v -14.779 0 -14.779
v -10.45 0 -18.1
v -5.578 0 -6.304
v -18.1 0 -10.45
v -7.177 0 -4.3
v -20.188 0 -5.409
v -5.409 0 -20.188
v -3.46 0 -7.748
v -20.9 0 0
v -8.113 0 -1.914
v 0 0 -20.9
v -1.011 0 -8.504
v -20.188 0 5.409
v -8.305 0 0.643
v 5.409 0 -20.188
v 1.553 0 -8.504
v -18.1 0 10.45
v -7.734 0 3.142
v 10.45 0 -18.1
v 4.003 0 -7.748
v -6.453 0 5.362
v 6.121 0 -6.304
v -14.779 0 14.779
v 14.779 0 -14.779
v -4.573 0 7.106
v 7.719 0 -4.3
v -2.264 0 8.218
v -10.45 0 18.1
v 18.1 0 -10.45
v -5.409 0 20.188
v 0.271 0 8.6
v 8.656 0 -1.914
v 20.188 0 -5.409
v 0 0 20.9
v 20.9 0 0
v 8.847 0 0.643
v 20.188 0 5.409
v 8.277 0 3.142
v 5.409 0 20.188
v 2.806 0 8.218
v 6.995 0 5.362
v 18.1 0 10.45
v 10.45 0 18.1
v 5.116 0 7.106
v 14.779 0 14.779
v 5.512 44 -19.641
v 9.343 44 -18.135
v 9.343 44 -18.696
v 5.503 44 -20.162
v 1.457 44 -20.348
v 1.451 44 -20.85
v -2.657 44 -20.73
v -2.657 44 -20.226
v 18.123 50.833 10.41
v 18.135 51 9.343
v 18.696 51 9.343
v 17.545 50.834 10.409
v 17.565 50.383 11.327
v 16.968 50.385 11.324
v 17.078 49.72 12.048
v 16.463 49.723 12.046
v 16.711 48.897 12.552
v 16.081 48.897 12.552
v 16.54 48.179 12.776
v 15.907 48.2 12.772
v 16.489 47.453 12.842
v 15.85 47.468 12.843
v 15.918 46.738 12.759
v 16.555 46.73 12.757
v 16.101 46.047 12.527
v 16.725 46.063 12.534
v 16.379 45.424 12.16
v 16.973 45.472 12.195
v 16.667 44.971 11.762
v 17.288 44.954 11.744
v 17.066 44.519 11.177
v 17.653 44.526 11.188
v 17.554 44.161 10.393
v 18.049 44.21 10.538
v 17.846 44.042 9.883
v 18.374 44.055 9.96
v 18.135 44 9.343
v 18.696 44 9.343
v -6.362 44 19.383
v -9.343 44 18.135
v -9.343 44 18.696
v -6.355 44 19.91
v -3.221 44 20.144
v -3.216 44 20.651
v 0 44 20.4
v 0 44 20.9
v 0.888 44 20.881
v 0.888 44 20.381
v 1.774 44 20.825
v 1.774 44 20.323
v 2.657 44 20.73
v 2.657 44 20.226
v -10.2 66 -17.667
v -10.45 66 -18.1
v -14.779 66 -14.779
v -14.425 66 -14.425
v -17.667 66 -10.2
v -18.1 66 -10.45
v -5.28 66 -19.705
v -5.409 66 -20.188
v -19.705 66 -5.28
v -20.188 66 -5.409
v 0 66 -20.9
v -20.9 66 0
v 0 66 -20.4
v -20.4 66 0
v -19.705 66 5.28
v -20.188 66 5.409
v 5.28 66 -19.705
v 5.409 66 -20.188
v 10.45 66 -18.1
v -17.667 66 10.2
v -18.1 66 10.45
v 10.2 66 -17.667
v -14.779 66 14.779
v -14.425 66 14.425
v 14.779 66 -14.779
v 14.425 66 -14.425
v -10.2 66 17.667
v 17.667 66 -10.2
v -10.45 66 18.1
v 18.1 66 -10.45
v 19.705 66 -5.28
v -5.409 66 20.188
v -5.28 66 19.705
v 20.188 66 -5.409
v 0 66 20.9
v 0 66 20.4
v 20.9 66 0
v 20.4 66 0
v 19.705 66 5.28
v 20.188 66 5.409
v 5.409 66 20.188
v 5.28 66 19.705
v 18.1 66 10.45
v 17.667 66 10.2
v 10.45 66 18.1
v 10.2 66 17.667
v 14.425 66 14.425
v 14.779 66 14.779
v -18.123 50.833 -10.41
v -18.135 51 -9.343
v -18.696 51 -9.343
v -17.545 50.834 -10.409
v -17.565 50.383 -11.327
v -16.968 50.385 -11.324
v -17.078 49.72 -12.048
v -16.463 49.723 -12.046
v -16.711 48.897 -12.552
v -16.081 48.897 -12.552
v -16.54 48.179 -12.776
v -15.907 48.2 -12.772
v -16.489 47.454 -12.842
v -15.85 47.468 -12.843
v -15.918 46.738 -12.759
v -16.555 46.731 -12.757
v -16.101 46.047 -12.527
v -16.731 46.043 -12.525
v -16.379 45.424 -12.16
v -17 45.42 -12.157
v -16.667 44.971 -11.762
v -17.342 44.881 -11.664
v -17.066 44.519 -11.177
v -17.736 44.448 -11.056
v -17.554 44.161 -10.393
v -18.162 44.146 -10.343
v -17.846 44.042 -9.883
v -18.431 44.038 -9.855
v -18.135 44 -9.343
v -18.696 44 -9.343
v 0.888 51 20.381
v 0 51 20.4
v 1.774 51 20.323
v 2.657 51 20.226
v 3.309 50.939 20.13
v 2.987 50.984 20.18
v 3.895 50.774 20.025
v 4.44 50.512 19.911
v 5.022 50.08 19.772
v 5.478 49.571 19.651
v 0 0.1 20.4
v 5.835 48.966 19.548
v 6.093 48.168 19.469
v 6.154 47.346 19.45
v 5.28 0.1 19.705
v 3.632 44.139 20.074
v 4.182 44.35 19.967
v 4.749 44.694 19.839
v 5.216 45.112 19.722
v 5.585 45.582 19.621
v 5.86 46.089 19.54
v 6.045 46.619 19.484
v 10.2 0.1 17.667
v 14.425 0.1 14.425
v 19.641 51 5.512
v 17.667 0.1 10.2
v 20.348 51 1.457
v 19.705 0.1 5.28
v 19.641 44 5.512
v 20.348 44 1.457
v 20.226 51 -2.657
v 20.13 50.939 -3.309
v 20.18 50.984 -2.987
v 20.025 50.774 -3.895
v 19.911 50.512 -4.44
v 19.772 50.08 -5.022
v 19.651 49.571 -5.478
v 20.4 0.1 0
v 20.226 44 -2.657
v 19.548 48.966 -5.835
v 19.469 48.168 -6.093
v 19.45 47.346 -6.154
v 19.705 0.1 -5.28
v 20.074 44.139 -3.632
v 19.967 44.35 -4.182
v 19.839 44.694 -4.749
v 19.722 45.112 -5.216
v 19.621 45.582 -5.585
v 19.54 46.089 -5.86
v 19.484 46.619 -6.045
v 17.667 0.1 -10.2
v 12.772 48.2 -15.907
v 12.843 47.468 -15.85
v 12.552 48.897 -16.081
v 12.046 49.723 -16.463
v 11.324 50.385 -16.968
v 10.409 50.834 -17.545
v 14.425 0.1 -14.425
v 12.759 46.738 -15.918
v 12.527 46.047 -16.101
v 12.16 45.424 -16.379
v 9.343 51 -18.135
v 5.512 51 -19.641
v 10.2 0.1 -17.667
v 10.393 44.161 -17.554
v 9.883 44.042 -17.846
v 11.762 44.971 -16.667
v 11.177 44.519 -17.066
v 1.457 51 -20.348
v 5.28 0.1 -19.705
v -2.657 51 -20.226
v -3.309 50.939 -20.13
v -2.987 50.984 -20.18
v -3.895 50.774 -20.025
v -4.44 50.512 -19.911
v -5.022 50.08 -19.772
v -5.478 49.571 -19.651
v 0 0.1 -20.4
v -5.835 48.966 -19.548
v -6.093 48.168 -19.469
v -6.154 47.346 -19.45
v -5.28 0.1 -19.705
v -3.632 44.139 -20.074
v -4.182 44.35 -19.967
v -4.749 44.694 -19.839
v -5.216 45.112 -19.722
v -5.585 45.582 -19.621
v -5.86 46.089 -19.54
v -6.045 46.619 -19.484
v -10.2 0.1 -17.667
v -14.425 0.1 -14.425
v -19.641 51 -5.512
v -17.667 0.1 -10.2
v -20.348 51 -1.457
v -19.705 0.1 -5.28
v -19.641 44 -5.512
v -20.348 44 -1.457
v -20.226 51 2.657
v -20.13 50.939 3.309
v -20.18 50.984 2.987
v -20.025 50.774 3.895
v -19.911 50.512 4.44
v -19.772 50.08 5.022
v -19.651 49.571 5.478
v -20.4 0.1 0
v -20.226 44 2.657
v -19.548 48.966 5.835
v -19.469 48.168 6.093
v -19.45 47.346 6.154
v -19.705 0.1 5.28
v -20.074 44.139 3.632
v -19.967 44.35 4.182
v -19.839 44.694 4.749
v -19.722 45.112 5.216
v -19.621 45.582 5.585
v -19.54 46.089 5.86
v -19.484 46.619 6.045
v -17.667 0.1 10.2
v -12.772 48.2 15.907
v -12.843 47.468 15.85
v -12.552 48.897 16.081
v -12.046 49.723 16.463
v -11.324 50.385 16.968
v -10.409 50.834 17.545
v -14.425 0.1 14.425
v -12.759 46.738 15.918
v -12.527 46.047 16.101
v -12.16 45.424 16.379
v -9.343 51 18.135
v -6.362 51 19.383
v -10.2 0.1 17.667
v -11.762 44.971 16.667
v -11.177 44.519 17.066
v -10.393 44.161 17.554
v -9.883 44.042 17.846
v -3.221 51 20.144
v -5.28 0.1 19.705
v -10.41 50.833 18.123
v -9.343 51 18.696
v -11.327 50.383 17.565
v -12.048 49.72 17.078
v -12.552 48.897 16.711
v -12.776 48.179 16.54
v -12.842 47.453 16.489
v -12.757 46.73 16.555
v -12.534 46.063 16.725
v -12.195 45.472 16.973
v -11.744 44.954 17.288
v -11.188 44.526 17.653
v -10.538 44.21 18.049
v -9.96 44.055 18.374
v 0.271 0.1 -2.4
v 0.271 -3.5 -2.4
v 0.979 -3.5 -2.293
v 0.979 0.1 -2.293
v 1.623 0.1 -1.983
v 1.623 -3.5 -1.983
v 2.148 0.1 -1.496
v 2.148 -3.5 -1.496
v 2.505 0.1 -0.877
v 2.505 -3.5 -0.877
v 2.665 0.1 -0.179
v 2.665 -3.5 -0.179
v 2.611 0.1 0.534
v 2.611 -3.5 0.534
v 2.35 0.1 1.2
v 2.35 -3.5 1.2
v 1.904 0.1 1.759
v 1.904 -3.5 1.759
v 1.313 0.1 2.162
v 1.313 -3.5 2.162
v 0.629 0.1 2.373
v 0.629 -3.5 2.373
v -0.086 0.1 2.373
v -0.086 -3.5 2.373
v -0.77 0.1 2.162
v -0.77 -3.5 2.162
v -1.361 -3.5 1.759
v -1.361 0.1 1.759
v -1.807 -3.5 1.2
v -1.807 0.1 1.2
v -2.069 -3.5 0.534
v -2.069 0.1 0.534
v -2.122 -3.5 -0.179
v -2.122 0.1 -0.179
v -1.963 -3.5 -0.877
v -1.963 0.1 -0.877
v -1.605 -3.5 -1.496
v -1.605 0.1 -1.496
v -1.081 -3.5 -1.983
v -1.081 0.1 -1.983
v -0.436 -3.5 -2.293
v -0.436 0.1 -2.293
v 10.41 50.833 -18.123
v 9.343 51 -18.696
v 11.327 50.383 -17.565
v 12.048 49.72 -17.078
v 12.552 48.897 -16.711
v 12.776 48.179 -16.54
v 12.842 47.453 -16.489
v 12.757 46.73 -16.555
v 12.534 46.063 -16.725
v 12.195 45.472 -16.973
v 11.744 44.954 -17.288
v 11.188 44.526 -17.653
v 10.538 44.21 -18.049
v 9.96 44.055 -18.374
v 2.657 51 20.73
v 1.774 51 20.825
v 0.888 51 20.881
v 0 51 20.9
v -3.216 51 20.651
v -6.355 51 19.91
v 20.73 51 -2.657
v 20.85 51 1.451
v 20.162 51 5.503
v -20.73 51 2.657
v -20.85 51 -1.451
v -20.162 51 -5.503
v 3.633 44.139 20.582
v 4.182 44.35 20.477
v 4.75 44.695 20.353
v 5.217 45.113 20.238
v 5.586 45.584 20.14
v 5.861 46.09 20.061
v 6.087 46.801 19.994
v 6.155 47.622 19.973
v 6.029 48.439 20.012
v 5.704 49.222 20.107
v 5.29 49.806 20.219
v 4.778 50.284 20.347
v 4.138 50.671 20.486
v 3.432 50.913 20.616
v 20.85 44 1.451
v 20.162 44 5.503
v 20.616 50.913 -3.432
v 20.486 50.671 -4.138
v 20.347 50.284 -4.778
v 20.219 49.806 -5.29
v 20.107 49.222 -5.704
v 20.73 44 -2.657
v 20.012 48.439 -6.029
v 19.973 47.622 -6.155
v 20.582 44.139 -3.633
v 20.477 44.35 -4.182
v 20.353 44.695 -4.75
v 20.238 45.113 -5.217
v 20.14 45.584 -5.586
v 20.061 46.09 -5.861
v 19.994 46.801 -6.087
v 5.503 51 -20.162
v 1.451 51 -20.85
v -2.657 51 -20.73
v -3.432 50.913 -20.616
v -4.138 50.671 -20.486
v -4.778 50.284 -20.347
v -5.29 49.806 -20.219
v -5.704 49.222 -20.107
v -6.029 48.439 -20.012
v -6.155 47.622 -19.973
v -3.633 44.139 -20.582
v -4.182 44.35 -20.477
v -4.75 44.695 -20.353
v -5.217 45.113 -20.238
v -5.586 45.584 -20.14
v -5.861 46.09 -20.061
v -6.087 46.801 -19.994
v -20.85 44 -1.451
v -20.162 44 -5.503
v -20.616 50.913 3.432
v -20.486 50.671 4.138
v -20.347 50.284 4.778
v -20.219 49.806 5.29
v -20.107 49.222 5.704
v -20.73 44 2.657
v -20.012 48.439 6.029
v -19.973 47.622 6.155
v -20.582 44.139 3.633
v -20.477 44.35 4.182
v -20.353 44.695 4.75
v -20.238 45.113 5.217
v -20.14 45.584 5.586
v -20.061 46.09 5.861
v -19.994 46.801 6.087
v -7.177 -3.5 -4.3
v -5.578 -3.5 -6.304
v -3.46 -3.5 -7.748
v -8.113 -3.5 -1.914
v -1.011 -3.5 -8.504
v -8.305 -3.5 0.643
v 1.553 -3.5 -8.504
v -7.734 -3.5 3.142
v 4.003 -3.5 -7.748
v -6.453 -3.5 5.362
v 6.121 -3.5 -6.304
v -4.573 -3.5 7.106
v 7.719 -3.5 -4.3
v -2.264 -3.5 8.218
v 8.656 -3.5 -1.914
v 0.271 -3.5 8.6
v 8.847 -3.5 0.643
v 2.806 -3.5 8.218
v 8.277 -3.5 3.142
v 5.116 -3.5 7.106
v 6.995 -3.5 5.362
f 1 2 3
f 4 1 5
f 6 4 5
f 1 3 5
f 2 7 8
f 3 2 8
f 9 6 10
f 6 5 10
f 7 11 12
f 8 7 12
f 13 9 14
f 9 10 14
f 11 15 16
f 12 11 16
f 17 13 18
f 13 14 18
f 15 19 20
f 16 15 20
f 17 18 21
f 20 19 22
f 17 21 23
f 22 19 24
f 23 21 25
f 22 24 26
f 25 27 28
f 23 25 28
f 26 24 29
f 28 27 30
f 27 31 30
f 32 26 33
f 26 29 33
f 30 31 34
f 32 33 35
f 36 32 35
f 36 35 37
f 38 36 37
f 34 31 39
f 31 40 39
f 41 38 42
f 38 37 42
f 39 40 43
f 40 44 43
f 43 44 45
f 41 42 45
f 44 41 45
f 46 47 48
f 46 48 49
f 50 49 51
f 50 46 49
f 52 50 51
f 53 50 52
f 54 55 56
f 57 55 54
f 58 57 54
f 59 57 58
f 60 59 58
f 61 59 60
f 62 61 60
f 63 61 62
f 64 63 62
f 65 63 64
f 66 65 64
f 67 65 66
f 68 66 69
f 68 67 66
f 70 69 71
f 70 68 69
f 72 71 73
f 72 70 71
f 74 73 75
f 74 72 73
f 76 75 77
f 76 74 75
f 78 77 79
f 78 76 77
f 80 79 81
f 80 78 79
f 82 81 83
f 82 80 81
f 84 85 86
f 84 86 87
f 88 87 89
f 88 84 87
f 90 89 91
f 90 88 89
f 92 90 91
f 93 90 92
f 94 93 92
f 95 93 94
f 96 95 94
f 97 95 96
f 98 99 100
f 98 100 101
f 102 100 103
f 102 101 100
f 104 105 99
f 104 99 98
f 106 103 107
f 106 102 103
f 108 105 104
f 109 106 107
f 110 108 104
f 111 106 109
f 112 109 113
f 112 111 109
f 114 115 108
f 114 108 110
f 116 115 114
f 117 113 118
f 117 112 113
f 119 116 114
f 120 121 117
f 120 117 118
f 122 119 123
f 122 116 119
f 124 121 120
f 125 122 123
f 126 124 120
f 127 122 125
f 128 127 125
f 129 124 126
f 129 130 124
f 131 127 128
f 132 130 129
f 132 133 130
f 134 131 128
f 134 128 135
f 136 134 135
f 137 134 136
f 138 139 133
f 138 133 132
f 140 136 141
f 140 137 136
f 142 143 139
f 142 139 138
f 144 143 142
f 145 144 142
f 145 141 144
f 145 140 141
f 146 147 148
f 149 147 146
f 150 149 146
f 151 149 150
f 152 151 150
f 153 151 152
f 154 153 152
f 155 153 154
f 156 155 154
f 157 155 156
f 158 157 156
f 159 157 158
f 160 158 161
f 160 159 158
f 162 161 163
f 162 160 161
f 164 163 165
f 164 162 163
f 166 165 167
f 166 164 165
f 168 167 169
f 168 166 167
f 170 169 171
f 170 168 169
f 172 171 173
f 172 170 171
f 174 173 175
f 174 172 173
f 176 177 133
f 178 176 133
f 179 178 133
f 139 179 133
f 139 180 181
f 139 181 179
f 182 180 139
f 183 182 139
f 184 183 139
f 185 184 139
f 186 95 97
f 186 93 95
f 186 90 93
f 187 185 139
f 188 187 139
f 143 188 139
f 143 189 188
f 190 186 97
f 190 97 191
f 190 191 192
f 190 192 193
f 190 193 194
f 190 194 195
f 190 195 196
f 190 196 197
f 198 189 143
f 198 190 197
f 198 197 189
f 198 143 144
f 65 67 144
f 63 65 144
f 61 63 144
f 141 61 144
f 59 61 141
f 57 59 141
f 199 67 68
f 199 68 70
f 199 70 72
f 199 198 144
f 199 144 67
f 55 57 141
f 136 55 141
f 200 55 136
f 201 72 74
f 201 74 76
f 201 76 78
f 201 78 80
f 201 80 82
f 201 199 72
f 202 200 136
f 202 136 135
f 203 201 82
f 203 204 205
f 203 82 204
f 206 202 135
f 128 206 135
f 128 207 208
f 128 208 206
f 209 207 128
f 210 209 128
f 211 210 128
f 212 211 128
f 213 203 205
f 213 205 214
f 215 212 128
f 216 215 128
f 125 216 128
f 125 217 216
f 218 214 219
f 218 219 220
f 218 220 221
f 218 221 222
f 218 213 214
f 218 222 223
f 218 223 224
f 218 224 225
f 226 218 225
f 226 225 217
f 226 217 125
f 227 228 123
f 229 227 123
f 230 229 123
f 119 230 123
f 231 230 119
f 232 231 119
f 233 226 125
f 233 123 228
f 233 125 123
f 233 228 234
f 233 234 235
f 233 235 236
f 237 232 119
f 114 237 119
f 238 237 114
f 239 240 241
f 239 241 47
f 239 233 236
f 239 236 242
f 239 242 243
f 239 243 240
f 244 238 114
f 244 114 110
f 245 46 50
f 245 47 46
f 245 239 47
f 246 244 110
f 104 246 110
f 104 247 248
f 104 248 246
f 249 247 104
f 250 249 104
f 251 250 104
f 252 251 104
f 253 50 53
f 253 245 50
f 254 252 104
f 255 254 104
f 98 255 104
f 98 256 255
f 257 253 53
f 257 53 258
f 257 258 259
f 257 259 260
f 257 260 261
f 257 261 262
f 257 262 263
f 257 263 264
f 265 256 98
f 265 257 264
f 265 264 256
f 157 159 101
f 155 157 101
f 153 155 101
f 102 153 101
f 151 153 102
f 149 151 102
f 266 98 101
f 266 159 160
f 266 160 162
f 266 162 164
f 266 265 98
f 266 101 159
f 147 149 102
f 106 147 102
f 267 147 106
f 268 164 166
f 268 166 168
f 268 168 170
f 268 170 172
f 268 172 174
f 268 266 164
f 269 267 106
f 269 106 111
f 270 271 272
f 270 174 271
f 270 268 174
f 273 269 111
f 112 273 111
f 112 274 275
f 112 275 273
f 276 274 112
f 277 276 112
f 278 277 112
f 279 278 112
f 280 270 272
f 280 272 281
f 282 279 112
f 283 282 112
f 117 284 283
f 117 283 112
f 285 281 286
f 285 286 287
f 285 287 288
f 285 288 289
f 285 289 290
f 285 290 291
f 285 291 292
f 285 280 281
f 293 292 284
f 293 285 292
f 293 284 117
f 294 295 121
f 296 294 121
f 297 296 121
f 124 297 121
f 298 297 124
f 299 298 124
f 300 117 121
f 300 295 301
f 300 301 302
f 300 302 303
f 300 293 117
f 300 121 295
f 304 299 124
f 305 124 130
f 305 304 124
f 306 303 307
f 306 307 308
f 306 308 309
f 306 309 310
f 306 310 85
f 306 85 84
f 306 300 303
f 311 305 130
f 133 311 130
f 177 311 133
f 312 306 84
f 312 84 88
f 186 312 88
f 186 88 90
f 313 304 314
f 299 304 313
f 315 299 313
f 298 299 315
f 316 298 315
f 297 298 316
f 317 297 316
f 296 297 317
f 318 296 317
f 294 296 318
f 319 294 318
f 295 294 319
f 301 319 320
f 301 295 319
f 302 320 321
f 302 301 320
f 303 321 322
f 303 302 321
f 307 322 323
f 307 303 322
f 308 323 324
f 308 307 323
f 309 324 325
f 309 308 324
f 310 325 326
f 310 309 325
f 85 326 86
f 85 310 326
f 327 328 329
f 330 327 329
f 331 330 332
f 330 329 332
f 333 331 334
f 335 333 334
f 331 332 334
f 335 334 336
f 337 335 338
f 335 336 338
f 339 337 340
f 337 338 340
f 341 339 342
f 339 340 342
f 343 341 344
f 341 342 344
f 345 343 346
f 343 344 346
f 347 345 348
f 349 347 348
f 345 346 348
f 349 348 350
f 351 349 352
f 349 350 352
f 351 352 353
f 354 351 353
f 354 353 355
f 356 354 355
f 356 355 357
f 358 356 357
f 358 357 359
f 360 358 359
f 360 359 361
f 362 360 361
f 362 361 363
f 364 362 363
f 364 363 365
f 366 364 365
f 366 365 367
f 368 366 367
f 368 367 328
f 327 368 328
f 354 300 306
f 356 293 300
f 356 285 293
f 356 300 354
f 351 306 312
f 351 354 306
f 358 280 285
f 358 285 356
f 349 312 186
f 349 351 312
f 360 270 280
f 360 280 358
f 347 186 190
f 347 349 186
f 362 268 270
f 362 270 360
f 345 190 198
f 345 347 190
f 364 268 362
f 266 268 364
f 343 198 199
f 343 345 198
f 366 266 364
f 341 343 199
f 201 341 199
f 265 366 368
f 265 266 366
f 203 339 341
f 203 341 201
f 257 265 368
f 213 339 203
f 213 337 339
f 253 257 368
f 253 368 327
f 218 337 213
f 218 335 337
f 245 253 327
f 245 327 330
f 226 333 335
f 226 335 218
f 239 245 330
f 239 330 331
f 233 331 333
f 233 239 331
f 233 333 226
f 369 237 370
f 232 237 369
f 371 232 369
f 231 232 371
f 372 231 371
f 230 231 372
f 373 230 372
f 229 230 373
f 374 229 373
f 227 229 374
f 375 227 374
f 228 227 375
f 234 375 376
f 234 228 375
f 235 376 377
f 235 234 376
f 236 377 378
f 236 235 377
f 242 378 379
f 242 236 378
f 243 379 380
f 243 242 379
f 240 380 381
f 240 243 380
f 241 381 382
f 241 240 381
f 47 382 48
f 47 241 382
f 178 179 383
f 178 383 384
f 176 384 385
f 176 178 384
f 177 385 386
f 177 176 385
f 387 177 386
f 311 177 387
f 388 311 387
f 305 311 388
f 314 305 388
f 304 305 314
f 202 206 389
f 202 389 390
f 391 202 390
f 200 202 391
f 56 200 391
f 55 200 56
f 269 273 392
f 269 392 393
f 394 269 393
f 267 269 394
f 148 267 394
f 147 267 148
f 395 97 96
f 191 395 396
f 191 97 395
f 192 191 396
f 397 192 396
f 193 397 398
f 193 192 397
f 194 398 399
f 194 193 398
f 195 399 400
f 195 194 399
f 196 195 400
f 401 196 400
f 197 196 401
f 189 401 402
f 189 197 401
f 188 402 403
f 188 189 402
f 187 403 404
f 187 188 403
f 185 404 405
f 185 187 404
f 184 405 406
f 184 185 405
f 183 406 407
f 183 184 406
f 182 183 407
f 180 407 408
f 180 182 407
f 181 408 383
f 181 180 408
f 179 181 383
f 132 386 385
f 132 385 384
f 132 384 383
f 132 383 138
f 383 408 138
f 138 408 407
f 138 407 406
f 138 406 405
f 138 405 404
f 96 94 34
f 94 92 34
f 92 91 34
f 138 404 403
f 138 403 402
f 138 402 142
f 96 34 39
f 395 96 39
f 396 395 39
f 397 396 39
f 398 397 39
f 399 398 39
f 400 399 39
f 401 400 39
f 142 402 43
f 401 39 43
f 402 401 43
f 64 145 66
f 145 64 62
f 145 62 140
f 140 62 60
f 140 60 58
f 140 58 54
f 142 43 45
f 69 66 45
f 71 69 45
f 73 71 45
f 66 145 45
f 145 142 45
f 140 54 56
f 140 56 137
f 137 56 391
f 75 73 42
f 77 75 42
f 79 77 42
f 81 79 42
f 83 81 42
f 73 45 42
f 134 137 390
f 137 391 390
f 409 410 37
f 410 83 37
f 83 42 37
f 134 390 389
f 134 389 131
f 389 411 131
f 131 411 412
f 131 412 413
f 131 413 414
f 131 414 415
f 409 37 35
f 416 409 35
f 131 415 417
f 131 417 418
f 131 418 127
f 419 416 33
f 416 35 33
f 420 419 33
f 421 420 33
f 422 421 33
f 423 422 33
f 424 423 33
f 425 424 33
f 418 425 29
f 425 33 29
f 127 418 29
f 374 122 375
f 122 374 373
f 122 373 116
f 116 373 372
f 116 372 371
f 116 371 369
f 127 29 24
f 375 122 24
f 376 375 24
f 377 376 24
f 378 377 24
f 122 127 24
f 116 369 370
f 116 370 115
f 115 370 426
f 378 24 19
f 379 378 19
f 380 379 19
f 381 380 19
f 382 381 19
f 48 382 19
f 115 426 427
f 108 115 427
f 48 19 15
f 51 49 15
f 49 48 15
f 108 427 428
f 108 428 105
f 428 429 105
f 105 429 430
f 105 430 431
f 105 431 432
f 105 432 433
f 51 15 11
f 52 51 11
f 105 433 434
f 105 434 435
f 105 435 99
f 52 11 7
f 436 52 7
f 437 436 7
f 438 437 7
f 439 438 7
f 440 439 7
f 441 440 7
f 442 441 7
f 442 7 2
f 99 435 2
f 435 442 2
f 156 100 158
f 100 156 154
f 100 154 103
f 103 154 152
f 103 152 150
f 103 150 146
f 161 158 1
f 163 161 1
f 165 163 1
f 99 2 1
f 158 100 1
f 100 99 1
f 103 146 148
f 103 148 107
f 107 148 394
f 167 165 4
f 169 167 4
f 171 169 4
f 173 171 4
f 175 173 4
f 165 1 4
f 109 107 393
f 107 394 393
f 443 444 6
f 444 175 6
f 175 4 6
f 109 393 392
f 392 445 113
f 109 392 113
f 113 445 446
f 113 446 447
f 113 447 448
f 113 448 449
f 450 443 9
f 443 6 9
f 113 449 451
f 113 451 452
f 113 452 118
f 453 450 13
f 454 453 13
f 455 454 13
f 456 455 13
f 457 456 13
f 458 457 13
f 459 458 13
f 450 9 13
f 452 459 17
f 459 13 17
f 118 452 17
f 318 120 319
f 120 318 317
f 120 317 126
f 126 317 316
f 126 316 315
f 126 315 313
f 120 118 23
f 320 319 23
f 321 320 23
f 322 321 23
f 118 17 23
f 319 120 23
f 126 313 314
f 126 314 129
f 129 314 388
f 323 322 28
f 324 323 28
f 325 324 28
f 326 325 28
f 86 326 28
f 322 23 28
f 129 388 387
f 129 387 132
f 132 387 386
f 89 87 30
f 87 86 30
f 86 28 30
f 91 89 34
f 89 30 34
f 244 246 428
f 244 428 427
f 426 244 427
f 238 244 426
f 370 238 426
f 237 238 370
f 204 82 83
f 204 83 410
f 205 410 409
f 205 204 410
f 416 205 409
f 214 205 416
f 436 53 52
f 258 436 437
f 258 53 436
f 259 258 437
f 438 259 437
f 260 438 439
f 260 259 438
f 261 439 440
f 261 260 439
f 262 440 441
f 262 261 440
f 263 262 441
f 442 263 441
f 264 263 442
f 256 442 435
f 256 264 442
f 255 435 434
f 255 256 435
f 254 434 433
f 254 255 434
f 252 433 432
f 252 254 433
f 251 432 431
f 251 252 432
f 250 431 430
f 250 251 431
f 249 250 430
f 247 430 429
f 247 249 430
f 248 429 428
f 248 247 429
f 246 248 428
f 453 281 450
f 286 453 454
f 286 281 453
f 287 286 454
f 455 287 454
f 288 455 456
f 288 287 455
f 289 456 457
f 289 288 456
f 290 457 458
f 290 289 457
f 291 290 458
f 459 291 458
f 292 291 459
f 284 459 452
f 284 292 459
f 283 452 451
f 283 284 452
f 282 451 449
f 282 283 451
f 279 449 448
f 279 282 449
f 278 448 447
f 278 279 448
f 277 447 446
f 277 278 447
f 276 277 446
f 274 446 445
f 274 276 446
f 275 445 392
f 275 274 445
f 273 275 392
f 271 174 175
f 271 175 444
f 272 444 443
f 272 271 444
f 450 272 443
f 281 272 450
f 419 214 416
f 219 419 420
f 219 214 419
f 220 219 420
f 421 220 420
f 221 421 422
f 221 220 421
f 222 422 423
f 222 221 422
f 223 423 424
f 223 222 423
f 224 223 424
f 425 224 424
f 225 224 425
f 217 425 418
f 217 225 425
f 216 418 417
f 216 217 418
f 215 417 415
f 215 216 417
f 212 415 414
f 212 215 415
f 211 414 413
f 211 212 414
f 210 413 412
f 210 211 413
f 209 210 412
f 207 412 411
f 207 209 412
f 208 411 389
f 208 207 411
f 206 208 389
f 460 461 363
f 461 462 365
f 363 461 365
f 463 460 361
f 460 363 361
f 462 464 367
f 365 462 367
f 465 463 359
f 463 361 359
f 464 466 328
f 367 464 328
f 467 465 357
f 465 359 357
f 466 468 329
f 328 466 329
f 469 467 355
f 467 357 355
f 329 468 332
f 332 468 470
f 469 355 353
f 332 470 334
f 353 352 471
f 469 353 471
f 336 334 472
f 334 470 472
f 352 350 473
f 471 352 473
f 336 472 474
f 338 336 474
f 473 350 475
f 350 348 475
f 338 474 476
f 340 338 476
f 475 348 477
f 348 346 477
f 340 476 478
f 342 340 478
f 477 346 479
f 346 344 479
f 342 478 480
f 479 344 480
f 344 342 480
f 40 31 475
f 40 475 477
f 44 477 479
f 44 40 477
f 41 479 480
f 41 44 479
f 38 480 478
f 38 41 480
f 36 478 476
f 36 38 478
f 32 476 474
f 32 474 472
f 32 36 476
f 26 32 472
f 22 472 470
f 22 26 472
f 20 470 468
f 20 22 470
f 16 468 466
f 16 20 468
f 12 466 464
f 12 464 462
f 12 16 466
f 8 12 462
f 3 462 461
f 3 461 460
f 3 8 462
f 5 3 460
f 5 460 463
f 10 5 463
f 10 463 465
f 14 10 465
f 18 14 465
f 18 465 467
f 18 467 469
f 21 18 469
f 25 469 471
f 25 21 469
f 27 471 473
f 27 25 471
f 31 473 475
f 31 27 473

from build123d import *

# Parameters (mm, degrees)
SKETCH2_R           = 20.9
SKETCH2_R_2         = 20.4
BOSS_EXTRUDE1_DEPTH = 66
SKETCH3_R           = 20.848686735
BOSS_EXTRUDE2_DEPTH = 0.1
SKETCH4_R           = 8.6
BOSS_EXTRUDE3_DEPTH = 3.5
SKETCH5_R           = 2.4
BOSS_EXTRUDE4_DEPTH = 1.35
SKETCH7_R           = 2.4
CUT_EXTRUDE1_DEPTH  = 76.523969705
CUT_EXTRUDE6_DEPTH  = 73.316111621
CIRPATTERN2_COUNT   = 4


with BuildPart() as part:
    # Sketch2 → Boss-Extrude1 (new body)
    with BuildSketch(Plane(origin=(0, 0, 0), x_dir=(1, 0, 0), z_dir=(0, 1, 0))):
        with Locations(Location((0, 0, 0), (0, 0, 270))):
            Circle(SKETCH2_R)
        with Locations(Location((0, 0, 0), (0, 0, 270))):
            Circle(SKETCH2_R_2, mode=Mode.SUBTRACT)
    extrude(amount=BOSS_EXTRUDE1_DEPTH)

    # Sketch3 → Boss-Extrude2 (add)
    with BuildSketch(Plane(origin=(0, 0, 0), x_dir=(1, 0, 0), z_dir=(0, 1, 0))):
        Circle(SKETCH3_R)
    extrude(amount=BOSS_EXTRUDE2_DEPTH)

    # Sketch4 → Boss-Extrude3 (add)
    with BuildSketch(Plane(origin=(0, 0, 0), x_dir=(1, 0, 0), z_dir=(0, 1, 0))):
        with Locations(Location((0.271248052, 0, 0), (0, 0, 270))):
            Circle(SKETCH4_R)
    extrude(amount=-BOSS_EXTRUDE3_DEPTH)

    # Sketch5 → Boss-Extrude4 (add)
    with BuildSketch(Plane.XZ.offset(3.5)):
        with Locations((0.36166407, 0)):
            Circle(SKETCH5_R)
    extrude(amount=-BOSS_EXTRUDE4_DEPTH)

    # Sketch7 → Cut-Extrude1 (cut, through all)
    with BuildSketch(Plane.XZ.offset(3.5)):
        with Locations(Location((0.271248052, 0, 0), (0, 0, 270))):
            Circle(SKETCH7_R)
    extrude(amount=-CUT_EXTRUDE1_DEPTH, mode=Mode.SUBTRACT)

    # Sketch15 → Cut-Extrude6 (cut, through all)
    with BuildSketch(Plane(origin=(0, 0, 0), x_dir=(0, 0, -1), z_dir=(1, 0, 0))):
        with BuildLine():
            Line((-2.657246102, 51), (9.342753898, 51))
            ThreePointArc((9.342753898, 51), (12.842753898, 47.5), (9.342753898, 44))
            Line((9.342753898, 44), (-2.657246102, 44))
            ThreePointArc((-2.657246102, 44), (-6.157246102, 47.5), (-2.657246102, 51))
        make_face()
    cut_extrude6 = extrude(amount=-CUT_EXTRUDE6_DEPTH, mode=Mode.SUBTRACT)

    # CirPattern2: Cut-Extrude6 ×4 about axis
    cirpattern2_axis = Axis((0, 66, 0), (0, -1, 0))
    for i in range(1, CIRPATTERN2_COUNT):
        add(cut_extrude6.rotate(cirpattern2_axis, i * 360 / CIRPATTERN2_COUNT), mode=Mode.SUBTRACT)


solid = part.part
